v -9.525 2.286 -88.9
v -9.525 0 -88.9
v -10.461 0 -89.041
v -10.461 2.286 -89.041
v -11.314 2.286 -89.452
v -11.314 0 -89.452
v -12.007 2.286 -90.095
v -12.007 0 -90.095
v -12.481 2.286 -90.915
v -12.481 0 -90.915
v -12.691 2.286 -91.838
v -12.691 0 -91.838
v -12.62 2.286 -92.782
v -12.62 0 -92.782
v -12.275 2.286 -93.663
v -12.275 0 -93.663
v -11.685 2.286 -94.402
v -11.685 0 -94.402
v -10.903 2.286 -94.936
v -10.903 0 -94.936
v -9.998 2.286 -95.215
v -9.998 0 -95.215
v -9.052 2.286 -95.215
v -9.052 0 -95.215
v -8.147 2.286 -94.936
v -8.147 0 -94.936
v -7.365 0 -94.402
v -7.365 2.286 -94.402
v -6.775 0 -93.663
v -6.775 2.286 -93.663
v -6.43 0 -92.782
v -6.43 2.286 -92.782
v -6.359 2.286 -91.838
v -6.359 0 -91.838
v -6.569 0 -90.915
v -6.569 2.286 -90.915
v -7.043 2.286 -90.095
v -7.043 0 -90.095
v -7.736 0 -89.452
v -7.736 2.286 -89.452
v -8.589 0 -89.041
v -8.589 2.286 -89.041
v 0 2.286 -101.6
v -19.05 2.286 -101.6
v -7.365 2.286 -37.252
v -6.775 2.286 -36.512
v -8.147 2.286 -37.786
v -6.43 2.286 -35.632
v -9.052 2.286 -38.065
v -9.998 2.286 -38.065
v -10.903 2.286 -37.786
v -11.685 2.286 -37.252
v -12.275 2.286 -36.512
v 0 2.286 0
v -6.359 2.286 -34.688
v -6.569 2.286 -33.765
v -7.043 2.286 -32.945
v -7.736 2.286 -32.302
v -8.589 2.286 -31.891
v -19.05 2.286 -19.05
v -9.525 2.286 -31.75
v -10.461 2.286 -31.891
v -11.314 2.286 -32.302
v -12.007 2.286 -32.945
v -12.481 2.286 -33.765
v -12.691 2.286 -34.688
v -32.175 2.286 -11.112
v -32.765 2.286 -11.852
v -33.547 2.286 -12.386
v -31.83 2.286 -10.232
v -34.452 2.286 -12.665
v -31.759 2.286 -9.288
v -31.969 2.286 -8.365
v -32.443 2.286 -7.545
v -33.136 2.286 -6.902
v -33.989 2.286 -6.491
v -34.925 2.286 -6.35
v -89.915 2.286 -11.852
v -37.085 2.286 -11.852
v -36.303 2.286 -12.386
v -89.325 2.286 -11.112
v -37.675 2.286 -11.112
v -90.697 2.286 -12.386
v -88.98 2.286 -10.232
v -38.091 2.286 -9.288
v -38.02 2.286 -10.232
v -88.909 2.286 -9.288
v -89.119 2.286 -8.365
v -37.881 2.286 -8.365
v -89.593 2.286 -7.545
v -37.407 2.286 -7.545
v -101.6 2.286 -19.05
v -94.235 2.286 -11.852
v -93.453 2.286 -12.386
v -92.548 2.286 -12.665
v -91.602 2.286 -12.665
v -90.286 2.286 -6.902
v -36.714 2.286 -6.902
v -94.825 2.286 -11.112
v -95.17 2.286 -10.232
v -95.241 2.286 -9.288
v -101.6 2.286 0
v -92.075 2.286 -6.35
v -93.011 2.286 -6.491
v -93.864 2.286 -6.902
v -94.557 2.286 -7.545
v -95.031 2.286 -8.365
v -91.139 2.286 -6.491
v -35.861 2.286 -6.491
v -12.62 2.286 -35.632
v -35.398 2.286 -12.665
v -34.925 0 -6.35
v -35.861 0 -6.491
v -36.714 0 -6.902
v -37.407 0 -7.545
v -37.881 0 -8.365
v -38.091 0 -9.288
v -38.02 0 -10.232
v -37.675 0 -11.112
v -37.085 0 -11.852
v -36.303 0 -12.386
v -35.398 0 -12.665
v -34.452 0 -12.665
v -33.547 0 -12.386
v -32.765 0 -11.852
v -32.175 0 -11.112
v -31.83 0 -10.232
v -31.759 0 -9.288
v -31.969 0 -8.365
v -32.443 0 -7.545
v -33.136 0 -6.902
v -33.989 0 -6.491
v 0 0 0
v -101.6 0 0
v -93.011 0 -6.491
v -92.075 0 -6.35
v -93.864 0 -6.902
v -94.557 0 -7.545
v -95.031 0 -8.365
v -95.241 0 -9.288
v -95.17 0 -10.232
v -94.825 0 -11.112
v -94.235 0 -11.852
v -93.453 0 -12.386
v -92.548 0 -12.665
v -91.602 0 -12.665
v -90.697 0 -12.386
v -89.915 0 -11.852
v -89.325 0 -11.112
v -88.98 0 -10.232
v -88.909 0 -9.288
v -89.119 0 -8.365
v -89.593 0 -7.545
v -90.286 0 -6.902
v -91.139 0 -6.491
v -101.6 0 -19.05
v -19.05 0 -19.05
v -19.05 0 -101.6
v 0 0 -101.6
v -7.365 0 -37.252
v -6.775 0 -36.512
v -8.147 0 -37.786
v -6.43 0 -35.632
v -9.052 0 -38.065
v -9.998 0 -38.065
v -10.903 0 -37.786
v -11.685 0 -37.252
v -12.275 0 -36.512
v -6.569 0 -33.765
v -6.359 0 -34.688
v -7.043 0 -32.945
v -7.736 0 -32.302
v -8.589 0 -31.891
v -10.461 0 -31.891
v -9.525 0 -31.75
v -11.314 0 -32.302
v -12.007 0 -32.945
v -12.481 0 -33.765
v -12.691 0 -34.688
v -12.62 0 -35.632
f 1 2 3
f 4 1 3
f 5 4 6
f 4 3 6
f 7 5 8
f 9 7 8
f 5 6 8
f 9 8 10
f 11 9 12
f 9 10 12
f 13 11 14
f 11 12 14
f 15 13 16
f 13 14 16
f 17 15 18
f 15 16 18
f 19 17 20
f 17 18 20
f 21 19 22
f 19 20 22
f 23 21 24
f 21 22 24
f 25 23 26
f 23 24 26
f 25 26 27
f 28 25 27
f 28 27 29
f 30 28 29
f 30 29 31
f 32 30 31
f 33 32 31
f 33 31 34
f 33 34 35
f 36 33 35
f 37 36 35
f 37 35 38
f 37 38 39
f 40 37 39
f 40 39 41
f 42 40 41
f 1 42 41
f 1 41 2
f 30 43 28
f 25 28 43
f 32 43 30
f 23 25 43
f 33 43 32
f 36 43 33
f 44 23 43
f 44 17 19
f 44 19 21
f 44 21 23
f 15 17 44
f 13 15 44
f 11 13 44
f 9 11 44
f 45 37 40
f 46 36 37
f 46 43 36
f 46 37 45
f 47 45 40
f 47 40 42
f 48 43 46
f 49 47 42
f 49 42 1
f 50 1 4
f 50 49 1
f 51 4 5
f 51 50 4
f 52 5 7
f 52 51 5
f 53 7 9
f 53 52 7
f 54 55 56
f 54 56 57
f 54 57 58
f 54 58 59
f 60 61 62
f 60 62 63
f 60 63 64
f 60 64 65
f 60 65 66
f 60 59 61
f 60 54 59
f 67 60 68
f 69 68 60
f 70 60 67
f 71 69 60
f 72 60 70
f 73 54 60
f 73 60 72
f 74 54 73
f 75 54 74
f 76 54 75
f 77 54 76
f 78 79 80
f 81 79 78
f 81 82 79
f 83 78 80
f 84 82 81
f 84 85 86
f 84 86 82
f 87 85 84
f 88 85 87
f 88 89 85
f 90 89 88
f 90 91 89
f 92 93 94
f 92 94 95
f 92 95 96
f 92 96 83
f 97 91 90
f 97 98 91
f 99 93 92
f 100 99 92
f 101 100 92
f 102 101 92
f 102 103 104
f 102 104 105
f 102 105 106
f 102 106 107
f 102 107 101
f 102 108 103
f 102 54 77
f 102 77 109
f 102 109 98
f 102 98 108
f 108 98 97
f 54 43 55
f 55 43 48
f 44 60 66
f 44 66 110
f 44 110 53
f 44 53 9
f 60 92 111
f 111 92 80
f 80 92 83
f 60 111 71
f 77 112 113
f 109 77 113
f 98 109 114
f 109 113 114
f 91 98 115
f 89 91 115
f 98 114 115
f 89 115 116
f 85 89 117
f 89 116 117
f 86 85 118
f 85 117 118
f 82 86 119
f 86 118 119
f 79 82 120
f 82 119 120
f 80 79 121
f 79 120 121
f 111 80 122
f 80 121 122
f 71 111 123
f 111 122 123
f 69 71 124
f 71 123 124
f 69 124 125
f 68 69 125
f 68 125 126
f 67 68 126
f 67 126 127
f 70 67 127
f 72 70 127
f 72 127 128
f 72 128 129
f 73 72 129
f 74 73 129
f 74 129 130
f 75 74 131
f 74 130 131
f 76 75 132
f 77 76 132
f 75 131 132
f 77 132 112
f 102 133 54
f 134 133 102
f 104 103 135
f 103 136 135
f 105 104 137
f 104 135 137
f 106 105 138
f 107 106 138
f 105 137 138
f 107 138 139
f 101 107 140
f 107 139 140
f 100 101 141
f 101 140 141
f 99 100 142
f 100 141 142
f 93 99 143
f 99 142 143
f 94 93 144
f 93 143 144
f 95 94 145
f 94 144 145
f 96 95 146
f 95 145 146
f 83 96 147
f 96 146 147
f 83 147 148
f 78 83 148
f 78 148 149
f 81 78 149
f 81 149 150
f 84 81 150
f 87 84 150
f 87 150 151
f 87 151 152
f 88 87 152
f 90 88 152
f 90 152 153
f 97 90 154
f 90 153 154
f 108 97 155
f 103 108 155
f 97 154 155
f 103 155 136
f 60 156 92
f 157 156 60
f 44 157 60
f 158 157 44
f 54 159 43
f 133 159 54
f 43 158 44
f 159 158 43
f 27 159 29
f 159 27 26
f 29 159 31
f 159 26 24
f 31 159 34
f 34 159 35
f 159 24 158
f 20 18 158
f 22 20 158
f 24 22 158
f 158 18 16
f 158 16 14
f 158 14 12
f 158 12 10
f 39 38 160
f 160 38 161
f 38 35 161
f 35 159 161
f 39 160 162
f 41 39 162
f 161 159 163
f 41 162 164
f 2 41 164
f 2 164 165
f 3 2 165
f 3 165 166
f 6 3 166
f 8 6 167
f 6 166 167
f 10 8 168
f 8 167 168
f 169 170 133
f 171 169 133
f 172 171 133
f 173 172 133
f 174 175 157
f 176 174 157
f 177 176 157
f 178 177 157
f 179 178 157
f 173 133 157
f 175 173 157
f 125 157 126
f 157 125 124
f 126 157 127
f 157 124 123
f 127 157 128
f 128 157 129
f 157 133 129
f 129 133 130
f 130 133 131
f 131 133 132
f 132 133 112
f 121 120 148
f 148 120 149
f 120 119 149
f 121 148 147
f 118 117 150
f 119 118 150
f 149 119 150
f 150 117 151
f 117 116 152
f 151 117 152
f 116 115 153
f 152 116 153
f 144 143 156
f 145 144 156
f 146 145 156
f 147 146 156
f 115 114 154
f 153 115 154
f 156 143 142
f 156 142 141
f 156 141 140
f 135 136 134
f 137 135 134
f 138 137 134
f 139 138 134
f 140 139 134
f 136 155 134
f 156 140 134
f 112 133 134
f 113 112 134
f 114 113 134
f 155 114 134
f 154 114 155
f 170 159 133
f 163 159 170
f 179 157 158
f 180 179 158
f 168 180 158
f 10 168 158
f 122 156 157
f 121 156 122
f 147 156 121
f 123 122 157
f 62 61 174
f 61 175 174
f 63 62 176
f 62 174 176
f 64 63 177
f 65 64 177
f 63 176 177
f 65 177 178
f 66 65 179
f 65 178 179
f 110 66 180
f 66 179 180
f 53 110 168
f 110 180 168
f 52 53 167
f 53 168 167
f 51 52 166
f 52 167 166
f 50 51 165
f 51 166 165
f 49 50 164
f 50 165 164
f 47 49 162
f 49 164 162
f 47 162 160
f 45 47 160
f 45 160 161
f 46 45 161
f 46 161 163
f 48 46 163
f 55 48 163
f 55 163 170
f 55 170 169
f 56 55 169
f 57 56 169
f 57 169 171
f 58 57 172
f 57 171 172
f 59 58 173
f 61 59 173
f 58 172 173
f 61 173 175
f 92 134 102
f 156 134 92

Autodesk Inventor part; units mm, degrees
ref_plane "YZ Plane" through (0, 0, 0) normal (1, 0, 0) x (0, 1, 0)
ref_plane "XZ Plane" through (0, 0, 0) normal (0, 1, 0) x (-1, 0, 0)
ref_plane "XY Plane" through (0, 0, 0) normal (0, 0, 1) x (1, 0, 0)
sketch "Sketch1" plane through (0, 0, 0) normal (0, 1, 0) x (-1, 0, 0)
  line L0 (0, 0) -> (101.6, 0)
  line L1 (101.6, 0) -> (101.6, -19.05)
  line L2 (101.6, -19.05) -> (0, -19.05)
  line L3 (0, -19.05) -> (0, 0)
  line L4 (0, 0) -> (19.05, 0)
  line L5 (19.05, 0) -> (19.05, -101.6)
  line L6 (19.05, -101.6) -> (0, -101.6)
  line L7 (0, -101.6) -> (0, 0)
  dimension "d0" = 101.6
  dimension "d1" = 19.05
  dimension "d2" = 19.05
  dimension "d3" = 101.6
extrude "Extrusion1" add sketch "Sketch1" along normal blind 2.286
sketch "Sketch2" plane through (0, 2.286, 0) normal (0, 1, 0) x (1, 0, 0)
  line L0 (0, 0) -> (0, 101.6) projected
  line L1 (-101.6, 0) -> (0, 0) projected
  point P0 (-34.925, 9.525)
  point P1 (-92.075, 9.525)
  point P2 (-9.525, 34.925)
  point P3 (-9.525, 92.075)
  dimension "d8" = 9.525
  dimension "d11" = 9.525
  dimension "d13" = 9.525
  dimension "d14" = 9.525
  dimension "d23" = 34.925
  dimension "d24" = 92.075
  dimension "d25" = 34.925
  dimension "d26" = 92.075
hole "Hole1" at (-34.925, 2.286, -9.525) at (-92.075, 2.286, -9.525) at (-9.525, 2.286, -34.925) at (-9.525, 2.286, -92.075) direction (0, -1, 0) diameter 6.35 end through all
properties part number "wood gusset" material "Steel, Alloy"
